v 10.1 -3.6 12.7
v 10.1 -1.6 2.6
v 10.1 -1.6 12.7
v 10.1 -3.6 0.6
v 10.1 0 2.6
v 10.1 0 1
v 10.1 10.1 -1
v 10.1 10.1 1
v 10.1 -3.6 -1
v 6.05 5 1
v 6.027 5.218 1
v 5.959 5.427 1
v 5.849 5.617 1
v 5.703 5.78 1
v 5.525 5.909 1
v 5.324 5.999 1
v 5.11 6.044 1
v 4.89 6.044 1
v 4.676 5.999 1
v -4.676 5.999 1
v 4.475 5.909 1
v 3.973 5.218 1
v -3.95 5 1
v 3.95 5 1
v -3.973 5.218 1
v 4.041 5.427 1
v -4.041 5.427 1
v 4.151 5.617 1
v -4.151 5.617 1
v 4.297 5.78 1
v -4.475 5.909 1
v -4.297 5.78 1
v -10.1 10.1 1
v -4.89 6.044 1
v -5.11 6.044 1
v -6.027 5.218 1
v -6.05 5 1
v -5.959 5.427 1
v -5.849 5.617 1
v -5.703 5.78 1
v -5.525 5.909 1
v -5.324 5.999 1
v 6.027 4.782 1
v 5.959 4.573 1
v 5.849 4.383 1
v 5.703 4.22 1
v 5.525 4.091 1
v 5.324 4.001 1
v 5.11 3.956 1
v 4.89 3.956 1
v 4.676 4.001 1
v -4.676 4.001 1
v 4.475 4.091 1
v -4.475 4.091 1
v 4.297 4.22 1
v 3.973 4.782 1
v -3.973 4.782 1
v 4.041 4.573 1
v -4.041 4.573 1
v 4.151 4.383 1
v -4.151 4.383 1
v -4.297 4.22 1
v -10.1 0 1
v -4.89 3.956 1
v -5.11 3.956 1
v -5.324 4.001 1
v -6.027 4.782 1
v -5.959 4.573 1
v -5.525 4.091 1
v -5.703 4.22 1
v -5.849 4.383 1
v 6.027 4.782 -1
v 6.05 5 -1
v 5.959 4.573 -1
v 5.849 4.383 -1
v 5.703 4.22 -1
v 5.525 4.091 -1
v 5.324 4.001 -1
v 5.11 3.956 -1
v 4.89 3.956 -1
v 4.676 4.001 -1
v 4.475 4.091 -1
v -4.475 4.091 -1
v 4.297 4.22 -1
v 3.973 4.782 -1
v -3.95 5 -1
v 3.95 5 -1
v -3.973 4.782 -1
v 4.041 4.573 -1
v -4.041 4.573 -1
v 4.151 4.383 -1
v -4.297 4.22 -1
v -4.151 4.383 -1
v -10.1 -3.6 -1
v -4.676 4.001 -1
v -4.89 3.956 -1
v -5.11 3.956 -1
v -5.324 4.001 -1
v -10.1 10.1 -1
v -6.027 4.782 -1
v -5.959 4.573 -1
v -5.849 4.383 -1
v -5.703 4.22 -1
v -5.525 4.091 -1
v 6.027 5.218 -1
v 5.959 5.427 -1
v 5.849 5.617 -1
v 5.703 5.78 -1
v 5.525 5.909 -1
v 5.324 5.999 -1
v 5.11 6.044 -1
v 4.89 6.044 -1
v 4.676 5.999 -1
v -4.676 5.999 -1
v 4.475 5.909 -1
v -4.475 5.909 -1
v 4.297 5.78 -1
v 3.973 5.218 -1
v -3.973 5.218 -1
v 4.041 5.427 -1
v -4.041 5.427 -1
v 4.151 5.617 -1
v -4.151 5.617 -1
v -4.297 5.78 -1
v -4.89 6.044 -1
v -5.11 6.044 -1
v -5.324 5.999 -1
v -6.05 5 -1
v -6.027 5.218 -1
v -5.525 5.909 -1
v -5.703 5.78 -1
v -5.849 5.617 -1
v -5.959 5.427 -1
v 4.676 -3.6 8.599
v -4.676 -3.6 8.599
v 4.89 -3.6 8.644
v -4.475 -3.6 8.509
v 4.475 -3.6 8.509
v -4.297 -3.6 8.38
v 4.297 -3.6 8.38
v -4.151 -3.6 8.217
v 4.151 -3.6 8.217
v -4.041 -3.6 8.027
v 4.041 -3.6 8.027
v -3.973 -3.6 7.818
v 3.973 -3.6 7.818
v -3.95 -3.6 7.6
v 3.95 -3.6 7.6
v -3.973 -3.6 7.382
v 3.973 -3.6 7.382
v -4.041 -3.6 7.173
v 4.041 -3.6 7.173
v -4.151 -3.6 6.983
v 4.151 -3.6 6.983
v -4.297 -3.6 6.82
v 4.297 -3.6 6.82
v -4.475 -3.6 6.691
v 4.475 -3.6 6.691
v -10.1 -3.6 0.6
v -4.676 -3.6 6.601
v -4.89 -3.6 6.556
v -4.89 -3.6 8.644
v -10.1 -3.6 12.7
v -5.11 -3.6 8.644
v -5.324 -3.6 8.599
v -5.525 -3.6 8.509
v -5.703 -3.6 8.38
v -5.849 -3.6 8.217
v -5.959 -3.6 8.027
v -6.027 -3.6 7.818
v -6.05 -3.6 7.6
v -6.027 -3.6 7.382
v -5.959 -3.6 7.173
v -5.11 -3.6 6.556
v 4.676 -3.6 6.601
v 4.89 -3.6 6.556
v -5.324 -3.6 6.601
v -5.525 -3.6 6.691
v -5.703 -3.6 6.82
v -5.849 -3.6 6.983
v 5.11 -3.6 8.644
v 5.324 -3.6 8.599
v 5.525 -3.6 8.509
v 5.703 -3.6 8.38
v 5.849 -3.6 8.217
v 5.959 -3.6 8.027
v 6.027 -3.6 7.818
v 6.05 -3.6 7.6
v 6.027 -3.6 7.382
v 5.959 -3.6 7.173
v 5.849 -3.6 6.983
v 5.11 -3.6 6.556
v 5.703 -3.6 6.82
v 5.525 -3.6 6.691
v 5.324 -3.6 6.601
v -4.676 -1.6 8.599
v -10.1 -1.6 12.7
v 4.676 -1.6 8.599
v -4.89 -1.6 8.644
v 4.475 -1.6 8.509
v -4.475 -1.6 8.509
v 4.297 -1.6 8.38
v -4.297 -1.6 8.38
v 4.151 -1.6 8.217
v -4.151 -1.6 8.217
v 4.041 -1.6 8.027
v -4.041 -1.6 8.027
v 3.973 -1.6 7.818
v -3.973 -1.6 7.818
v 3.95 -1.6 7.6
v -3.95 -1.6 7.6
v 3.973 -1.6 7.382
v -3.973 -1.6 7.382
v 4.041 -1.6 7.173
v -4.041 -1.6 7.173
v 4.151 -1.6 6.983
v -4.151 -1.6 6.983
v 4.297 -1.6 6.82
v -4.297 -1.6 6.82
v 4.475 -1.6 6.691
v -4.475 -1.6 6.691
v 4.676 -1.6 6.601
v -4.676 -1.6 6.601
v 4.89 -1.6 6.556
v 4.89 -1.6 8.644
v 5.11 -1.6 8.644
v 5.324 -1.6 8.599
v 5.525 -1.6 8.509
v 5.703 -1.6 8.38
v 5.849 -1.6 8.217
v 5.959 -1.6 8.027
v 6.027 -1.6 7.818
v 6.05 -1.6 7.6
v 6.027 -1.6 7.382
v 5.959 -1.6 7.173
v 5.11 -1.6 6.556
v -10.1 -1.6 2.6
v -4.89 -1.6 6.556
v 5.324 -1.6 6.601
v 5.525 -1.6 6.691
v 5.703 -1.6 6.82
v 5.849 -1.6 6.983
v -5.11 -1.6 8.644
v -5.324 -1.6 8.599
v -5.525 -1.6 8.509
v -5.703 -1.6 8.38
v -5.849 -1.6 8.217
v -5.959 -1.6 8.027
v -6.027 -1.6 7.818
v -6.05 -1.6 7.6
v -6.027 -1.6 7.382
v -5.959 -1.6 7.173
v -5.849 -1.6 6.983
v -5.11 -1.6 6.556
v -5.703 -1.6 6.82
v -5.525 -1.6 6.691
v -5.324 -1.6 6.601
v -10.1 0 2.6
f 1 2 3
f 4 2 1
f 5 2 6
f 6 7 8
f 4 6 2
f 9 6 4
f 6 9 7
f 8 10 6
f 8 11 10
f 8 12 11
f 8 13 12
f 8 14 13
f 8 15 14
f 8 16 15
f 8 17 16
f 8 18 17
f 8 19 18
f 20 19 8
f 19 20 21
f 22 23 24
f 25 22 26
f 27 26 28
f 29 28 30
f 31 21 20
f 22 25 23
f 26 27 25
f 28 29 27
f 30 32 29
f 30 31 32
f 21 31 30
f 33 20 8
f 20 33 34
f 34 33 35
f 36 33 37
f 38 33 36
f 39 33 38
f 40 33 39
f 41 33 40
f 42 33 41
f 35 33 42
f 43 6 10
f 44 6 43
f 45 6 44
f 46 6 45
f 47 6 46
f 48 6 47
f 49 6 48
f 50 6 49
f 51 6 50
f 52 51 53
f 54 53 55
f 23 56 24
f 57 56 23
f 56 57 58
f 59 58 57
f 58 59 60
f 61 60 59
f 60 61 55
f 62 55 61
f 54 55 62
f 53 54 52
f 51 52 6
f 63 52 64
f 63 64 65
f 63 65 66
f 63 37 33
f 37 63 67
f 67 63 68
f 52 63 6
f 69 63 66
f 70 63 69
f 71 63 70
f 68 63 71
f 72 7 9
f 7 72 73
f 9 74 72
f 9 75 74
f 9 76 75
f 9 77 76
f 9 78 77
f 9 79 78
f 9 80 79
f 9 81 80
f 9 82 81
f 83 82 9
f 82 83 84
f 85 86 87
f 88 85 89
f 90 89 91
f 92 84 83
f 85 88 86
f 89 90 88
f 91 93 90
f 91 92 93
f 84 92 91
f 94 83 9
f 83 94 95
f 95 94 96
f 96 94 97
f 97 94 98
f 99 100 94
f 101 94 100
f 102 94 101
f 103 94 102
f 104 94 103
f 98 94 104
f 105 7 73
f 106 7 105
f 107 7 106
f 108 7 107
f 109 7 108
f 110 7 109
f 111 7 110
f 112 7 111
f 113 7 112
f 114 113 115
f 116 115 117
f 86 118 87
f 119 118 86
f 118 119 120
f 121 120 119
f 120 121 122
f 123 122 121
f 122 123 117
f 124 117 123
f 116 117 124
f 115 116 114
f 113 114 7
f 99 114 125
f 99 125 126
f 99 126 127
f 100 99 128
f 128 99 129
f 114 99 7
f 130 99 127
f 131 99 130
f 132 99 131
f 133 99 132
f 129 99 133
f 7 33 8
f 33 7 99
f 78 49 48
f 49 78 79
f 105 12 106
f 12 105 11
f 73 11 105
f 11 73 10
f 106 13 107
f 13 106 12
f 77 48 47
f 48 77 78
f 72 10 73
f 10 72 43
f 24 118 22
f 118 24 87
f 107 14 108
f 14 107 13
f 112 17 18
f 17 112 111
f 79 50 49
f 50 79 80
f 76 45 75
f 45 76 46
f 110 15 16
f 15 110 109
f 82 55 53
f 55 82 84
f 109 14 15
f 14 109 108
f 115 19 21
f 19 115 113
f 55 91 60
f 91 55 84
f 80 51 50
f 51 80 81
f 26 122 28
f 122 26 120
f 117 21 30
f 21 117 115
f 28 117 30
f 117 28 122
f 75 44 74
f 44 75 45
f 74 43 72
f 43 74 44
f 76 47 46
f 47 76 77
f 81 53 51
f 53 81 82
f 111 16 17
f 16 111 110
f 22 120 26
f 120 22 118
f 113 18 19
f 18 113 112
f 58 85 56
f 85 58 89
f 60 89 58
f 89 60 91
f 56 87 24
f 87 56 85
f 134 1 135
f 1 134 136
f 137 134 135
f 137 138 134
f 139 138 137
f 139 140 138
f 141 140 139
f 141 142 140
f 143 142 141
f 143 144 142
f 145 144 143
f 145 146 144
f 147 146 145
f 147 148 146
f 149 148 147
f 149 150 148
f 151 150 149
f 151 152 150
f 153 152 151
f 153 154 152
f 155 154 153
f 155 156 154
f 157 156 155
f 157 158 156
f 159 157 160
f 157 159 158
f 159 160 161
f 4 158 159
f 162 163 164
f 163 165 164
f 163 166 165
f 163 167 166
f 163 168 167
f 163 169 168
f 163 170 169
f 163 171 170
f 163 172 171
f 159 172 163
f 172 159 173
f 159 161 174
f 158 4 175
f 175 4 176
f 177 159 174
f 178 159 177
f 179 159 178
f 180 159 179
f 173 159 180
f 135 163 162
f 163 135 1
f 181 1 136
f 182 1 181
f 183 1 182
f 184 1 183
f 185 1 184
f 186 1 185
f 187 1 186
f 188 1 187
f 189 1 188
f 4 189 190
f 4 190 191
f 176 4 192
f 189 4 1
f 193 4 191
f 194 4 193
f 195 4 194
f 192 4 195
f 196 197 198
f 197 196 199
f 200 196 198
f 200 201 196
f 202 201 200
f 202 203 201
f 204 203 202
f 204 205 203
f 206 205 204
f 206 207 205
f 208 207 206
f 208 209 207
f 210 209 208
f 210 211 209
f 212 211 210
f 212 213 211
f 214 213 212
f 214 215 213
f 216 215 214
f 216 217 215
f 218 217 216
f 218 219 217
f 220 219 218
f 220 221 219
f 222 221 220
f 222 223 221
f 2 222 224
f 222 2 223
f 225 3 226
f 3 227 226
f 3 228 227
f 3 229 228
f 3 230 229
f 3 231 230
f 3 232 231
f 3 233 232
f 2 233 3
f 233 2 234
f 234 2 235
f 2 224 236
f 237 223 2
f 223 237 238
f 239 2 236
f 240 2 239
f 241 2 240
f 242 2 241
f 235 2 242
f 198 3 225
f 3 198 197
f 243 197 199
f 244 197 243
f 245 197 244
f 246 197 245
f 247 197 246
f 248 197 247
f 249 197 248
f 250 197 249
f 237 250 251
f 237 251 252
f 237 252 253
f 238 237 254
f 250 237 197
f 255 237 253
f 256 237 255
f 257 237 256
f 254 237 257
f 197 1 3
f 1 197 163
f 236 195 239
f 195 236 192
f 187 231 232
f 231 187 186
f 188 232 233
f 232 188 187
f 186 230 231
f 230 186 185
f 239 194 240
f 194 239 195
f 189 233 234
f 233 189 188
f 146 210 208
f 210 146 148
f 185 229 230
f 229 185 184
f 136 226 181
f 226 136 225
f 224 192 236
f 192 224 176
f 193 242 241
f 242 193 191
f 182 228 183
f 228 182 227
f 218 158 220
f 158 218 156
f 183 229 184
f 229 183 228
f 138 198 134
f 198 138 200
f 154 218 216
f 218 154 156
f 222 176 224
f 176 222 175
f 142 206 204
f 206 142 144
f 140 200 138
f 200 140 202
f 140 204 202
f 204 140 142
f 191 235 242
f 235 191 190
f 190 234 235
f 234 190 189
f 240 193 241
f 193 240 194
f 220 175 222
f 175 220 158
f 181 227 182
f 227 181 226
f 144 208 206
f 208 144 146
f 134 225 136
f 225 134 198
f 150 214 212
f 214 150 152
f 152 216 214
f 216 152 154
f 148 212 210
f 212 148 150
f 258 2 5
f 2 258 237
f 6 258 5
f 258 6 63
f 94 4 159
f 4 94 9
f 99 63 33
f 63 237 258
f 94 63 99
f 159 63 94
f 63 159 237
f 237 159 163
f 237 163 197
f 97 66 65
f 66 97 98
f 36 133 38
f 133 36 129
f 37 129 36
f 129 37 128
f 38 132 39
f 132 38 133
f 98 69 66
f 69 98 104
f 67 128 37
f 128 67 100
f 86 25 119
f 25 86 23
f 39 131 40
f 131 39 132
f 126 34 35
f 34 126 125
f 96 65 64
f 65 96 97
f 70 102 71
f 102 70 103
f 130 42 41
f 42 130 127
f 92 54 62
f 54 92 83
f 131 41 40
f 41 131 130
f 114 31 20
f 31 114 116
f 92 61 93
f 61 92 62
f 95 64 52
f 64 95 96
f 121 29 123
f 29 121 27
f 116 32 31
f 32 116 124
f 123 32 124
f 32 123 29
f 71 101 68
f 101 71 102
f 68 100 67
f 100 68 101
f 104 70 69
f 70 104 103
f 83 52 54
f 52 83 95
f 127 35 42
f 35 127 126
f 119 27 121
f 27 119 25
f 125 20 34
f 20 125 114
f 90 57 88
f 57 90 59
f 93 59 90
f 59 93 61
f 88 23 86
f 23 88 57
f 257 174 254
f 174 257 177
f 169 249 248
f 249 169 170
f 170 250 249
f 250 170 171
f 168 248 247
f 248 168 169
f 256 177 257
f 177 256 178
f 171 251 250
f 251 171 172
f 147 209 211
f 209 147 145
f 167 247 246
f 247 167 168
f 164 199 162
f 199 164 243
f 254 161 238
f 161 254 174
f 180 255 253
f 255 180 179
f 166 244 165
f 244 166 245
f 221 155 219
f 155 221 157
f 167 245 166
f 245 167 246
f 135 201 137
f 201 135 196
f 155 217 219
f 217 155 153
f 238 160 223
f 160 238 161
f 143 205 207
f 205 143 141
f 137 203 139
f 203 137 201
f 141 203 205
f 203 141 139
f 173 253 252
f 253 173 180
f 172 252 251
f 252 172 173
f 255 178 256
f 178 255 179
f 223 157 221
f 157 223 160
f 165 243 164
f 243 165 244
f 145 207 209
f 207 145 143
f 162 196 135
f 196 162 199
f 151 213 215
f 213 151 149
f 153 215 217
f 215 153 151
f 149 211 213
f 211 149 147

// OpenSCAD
p_tk = 2;
h_d = 2.1;
Off_X = 5;
Off_Y = 5;
b_tk = 1.6;

ext = 0.1;
$fn = 30;

module plate()
{
    translate([ 0, 0, -p_tk / 2 ]) difference()
    {
        translate([ -p_tk, -p_tk, 0 ]) cube([ (Off_X + h_d + 3) + p_tk, (Off_Y + h_d + 3) + p_tk, p_tk ]);
        translate([ Off_X, Off_Y, -ext ]) cylinder(h = p_tk + ext * 2, d = h_d);
    }
}

module p_1x2()
{
    plate();
    mirror([ 0, 1, 0 ]) plate();
}

module e_1x2()
{
    plate();
    translate([ 0, -p_tk / 2 - b_tk, p_tk / 2 + b_tk ]) rotate([ 90, 0, 0 ]) plate();
    translate([ -p_tk, -p_tk - b_tk, -p_tk / 2 ]) cube([ Off_X + h_d + 3 + p_tk, p_tk + b_tk, p_tk + b_tk ]);
}

module p_2x2()
{
    p_1x2();
    mirror([ 1, 0, 0 ]) p_1x2();
}

module e_2x2()
{
    e_1x2();
    mirror([ 1, 0, 0 ]) e_1x2();
}

module corner()
{
    plate();

    translate([ -p_tk / 2 - b_tk, 0, p_tk / 2 + b_tk ]) rotate([ 0, -90, 0 ]) plate();

    translate([ 0, -p_tk / 2 - b_tk, p_tk / 2 + b_tk ]) rotate([ 90, 0, 0 ]) plate();
    translate([ -p_tk, -p_tk - b_tk, -p_tk / 2 ]) cube([ Off_X + h_d + 3 + p_tk, p_tk + b_tk, p_tk + b_tk ]);
    translate([ -p_tk - b_tk, -p_tk, -p_tk / 2 ]) cube([ p_tk + b_tk, Off_X + h_d + 3 + p_tk, p_tk + b_tk ]);

    translate([ -p_tk - b_tk, -p_tk - b_tk, -p_tk / 2 ])
        cube([ p_tk + b_tk, p_tk + b_tk, Off_X + h_d + 3 + p_tk * 1 + b_tk ]);
}

e_2x2();
